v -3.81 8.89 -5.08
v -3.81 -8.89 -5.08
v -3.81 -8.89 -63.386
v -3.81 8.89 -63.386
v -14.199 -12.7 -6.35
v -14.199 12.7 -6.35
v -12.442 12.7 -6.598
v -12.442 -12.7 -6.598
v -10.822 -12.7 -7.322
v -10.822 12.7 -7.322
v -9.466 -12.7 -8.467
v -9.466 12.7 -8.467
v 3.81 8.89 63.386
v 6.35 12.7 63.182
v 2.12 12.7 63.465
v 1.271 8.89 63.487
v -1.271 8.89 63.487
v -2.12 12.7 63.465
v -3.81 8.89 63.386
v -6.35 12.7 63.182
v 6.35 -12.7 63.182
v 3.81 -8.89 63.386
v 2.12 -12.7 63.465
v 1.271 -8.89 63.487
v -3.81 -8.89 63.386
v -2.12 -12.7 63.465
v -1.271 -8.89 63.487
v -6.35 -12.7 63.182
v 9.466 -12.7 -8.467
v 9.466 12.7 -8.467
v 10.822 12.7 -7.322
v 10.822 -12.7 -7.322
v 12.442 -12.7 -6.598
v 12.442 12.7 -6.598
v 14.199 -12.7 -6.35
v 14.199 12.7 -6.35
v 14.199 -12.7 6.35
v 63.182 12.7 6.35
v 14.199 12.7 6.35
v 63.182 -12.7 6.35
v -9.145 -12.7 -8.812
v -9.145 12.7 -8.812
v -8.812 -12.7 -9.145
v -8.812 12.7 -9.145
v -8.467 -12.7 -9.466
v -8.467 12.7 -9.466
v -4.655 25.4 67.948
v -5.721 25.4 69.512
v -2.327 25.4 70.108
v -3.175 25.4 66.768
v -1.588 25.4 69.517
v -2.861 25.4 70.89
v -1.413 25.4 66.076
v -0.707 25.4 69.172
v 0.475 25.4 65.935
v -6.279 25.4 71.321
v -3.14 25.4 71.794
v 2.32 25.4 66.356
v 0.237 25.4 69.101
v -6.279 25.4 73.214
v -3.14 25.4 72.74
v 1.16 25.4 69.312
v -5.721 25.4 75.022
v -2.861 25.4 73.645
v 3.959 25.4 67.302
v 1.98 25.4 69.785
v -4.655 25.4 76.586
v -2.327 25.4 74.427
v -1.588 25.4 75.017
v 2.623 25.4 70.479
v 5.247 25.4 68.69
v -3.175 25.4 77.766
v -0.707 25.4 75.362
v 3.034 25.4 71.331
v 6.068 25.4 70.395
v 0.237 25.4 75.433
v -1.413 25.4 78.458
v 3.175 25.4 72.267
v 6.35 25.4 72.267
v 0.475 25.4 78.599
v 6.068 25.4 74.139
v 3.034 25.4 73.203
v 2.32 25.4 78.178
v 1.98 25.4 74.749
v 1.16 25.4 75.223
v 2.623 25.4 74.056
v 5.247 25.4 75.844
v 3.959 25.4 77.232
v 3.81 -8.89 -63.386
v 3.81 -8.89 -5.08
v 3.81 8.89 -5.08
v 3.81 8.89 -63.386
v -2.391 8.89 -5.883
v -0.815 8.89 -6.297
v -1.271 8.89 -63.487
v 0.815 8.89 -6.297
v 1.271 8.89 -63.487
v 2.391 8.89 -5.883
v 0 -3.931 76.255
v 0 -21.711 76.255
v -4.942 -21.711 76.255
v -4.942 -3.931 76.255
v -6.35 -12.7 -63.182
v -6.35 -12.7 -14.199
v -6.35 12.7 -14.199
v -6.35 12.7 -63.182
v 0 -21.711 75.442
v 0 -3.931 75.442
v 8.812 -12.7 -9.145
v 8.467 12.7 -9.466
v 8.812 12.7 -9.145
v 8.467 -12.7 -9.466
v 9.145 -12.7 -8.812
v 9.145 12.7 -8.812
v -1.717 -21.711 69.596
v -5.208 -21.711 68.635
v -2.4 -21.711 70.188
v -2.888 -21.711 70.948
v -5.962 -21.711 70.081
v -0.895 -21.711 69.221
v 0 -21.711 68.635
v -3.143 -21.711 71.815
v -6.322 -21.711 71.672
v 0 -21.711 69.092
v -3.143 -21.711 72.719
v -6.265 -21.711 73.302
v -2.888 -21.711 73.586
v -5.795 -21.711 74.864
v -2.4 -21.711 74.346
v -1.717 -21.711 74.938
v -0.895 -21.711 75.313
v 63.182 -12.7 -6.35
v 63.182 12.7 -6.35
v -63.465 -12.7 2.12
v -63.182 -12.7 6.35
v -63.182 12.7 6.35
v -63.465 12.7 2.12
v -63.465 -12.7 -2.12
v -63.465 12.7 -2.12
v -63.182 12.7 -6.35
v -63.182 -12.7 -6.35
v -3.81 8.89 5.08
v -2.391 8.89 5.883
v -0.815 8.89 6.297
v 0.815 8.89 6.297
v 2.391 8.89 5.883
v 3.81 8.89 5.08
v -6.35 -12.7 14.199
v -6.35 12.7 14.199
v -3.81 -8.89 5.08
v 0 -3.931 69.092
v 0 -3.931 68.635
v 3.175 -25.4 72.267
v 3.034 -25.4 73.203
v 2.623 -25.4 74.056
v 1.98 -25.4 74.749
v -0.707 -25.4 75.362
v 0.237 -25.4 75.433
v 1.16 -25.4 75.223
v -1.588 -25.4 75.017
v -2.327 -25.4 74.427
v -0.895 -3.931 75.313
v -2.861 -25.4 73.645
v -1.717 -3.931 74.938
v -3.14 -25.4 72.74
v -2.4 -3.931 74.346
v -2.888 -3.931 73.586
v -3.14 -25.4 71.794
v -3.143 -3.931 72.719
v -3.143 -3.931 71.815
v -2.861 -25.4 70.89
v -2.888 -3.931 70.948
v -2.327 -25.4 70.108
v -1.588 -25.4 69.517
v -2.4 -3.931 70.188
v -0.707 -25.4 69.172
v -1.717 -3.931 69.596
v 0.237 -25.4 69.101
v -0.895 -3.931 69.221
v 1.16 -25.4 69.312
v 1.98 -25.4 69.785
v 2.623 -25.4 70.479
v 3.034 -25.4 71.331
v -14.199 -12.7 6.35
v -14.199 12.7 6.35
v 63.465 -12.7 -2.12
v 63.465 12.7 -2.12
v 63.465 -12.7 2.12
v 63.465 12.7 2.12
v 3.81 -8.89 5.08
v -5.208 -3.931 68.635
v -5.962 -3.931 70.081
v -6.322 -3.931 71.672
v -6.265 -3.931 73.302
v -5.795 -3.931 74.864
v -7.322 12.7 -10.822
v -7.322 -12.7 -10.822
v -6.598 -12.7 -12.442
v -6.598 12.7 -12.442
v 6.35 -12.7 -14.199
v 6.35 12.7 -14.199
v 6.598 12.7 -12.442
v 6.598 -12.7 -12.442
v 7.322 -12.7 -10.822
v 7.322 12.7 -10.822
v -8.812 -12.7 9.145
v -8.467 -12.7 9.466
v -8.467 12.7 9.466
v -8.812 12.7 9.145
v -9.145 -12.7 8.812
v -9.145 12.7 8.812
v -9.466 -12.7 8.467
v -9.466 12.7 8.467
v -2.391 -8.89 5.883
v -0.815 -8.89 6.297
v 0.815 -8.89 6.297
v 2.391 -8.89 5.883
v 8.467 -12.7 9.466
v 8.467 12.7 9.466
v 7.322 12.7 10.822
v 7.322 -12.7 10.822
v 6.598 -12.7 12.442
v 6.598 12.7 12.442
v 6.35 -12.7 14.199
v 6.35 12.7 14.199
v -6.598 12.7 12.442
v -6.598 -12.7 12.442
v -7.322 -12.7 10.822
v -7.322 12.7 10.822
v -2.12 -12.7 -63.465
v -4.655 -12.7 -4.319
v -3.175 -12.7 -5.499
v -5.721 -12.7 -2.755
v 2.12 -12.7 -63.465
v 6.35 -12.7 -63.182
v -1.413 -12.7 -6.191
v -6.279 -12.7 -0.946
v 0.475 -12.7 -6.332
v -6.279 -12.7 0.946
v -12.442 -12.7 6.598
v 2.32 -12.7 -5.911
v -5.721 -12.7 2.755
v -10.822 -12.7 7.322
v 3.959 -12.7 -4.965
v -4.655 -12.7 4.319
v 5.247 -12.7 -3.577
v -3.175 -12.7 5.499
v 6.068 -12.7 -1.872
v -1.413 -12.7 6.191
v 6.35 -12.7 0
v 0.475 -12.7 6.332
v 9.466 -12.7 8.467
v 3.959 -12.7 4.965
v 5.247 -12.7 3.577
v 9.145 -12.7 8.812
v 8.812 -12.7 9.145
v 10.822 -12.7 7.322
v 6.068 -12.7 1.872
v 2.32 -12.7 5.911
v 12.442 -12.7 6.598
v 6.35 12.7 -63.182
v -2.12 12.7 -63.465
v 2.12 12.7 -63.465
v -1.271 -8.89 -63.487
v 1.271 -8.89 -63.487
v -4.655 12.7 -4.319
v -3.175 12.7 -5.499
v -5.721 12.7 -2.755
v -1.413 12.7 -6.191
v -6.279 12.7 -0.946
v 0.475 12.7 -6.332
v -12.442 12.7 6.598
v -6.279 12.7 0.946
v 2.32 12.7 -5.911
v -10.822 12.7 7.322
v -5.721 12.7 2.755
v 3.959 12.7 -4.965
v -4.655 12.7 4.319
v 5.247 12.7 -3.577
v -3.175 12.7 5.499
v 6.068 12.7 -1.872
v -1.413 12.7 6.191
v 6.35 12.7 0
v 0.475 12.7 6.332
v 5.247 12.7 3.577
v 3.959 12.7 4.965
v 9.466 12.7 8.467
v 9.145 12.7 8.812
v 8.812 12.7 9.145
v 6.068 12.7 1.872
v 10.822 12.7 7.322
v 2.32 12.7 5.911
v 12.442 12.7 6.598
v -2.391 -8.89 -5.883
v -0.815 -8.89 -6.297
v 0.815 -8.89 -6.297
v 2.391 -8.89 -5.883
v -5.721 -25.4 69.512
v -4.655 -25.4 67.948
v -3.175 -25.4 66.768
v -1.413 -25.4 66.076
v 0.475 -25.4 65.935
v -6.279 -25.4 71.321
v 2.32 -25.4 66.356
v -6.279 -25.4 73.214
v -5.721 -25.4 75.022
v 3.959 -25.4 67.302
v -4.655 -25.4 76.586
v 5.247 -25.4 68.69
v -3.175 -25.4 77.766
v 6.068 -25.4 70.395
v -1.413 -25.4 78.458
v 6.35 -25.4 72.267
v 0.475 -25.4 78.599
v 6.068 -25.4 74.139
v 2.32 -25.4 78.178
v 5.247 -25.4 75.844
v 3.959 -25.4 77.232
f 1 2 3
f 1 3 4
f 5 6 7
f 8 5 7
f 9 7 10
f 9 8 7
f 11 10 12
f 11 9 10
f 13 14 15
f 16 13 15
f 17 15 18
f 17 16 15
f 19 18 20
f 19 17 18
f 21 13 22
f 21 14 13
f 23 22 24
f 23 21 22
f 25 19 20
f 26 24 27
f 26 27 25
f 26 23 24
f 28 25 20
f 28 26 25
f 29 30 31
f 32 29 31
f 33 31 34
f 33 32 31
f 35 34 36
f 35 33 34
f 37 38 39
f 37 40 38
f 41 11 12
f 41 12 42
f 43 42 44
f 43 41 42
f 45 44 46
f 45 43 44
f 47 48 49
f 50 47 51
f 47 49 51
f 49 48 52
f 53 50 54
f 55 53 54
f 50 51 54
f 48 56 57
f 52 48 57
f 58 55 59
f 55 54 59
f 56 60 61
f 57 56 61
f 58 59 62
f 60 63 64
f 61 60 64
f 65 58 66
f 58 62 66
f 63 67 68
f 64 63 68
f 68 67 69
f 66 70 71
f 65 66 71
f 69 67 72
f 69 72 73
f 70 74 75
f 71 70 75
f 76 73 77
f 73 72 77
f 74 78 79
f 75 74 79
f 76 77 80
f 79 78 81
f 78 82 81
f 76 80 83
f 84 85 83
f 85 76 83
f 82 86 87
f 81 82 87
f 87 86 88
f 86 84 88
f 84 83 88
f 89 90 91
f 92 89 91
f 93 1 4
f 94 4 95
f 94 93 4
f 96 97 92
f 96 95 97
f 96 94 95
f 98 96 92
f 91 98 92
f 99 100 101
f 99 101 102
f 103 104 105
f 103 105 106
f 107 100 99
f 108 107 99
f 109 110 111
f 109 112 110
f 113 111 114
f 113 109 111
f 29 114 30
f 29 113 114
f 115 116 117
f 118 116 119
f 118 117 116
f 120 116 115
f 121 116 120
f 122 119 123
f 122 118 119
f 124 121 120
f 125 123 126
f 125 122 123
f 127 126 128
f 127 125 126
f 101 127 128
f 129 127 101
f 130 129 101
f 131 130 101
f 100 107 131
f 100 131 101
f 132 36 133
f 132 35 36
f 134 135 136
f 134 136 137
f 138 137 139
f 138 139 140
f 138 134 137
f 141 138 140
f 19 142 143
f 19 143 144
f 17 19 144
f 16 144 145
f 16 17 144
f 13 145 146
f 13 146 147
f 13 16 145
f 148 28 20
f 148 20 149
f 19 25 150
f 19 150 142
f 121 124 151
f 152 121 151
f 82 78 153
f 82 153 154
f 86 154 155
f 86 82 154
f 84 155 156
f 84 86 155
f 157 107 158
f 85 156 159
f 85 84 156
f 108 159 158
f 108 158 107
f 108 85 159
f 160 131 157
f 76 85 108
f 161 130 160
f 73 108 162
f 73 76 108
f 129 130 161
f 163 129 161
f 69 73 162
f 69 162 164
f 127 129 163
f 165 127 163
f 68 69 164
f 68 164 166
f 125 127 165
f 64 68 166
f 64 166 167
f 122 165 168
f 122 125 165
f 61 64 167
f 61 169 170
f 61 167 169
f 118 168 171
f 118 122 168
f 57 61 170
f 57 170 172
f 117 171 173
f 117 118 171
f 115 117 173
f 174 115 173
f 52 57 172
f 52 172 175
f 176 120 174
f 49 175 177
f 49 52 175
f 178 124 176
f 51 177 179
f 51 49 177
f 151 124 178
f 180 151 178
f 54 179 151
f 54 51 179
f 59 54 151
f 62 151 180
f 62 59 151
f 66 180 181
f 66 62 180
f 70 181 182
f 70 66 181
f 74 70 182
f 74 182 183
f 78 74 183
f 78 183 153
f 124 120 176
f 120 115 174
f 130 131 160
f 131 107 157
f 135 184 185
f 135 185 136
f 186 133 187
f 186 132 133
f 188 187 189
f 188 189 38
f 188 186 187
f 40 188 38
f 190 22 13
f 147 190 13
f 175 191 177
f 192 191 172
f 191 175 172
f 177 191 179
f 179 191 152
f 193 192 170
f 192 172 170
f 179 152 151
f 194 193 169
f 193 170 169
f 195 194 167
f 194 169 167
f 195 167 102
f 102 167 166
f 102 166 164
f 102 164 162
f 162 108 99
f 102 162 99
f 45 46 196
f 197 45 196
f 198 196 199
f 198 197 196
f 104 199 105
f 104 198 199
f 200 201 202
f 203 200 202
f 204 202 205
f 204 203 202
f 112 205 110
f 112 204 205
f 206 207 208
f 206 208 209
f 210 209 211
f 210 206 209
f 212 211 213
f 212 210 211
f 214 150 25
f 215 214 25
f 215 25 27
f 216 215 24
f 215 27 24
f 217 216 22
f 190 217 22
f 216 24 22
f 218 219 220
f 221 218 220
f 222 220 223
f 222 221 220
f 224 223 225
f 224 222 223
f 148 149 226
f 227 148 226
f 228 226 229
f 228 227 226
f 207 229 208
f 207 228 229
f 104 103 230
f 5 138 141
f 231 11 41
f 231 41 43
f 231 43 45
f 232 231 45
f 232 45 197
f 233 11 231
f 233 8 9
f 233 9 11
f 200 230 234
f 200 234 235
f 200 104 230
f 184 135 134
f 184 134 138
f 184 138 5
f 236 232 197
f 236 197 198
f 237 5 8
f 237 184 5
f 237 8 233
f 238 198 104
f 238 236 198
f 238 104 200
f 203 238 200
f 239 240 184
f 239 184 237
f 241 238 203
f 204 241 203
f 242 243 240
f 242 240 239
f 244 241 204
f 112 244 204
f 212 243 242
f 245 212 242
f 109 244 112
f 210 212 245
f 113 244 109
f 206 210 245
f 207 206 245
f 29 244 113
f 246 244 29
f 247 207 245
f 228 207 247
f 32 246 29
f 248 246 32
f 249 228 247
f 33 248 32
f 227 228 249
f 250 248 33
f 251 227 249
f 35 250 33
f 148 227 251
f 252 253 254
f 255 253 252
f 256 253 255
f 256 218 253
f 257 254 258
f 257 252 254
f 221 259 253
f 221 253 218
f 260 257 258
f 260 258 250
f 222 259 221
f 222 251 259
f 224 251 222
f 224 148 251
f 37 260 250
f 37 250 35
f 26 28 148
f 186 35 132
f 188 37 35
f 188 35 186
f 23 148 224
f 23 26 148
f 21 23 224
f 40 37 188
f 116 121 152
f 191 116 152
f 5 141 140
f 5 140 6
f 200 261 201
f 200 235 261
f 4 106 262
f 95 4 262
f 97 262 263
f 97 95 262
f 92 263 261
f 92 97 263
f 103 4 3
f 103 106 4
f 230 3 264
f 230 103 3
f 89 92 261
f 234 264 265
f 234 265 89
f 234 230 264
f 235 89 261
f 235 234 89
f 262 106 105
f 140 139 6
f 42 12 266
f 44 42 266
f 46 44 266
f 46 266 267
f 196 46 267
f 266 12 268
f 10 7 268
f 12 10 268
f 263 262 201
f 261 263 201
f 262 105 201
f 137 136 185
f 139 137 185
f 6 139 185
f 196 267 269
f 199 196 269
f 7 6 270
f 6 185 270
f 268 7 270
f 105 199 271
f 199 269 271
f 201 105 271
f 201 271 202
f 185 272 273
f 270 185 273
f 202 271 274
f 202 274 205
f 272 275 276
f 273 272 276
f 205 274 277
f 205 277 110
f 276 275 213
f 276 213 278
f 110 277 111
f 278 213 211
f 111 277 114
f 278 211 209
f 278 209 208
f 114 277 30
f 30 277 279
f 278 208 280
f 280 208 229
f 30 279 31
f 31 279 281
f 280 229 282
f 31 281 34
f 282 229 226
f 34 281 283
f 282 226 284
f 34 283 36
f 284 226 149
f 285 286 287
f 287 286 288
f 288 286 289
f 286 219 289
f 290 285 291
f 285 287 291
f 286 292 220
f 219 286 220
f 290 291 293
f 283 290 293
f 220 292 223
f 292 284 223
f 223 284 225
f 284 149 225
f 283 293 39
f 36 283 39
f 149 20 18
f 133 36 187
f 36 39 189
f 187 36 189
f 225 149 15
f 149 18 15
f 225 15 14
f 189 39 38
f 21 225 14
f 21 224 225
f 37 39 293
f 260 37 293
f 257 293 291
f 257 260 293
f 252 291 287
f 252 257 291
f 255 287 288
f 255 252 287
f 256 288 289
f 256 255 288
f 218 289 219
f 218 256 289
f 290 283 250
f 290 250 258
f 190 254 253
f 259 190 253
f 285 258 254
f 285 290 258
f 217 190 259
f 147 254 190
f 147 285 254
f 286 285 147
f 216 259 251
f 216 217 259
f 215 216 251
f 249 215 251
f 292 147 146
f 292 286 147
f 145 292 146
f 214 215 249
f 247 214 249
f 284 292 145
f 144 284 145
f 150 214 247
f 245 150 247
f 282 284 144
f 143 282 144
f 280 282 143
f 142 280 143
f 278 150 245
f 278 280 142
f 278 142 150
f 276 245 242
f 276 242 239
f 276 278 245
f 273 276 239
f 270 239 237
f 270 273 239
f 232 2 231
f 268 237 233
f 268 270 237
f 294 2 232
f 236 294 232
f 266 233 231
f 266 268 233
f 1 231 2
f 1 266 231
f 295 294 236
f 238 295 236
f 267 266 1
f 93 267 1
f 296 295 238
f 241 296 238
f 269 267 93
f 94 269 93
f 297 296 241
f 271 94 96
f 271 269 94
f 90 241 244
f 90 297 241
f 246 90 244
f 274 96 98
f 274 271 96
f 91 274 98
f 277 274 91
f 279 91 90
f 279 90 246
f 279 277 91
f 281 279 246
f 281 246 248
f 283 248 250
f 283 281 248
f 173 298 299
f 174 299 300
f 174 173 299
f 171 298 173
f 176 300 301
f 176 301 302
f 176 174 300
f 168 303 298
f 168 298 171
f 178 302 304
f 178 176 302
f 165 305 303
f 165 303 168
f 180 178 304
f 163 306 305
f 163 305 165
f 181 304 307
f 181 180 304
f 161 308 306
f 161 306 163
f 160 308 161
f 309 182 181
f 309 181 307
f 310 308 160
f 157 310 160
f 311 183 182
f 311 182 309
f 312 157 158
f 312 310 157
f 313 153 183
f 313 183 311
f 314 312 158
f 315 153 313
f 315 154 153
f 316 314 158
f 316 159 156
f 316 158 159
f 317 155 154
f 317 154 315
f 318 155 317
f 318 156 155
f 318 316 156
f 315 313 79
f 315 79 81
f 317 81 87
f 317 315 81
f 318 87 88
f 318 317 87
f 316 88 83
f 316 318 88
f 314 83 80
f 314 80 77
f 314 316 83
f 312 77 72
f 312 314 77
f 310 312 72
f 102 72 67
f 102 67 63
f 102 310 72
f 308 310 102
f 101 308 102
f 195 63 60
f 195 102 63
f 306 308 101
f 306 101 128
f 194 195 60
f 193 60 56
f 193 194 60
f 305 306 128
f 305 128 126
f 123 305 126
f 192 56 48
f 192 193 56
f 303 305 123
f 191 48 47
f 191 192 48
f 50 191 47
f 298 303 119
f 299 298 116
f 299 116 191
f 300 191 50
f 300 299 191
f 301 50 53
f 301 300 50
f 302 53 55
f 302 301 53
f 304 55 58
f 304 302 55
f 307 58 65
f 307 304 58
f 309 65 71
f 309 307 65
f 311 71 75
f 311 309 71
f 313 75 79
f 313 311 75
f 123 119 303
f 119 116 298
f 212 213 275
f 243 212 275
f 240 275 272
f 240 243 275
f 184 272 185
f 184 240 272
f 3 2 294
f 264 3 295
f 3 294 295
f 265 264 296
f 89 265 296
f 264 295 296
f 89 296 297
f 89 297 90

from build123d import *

# Parameters (mm, degrees)
F0_R     = 6.35
F1_DEPTH = 12.7
F2_W     = 7.62
F2_H     = 17.78
F3_DEPTH = 63.5
F4_R     = 6.35
F4_R_2   = 3.175
F5_DEPTH = 25.4
F6_W     = 17.78
F6_H     = 7.62
F7_DEPTH = 7.62


with BuildPart() as f1:
    # F0 (on Front) → F1 (new body, symmetric)
    with BuildSketch(Plane.XZ):
        with BuildLine():
            Line((6.35, 14.1990316571), (6.35, 63.1817022563))
            ThreePointArc((6.35, 63.1817022563), (0, 63.5), (-6.35, 63.1817022563))
            Line((-6.35, 63.1817022563), (-6.35, 14.1990316571))
            ThreePointArc((-6.35, 14.1990316571), (-6.9032695997, 11.6066550127), (-8.4666666667, 9.4660211047))
            ThreePointArc((-8.4666666667, 9.4660211047), (-8.9802561211, 8.9802561211), (-9.4660211047, 8.4666666667))
            ThreePointArc((-9.4660211047, 8.4666666667), (-11.6066550127, 6.9032695997), (-14.1990316571, 6.35))
            Line((-14.1990316571, 6.35), (-63.1817022563, 6.35))
            ThreePointArc((-63.1817022563, 6.35), (-63.5, 0), (-63.1817022563, -6.35))
            Line((-63.1817022563, -6.35), (-14.1990316571, -6.35))
            ThreePointArc((-14.1990316571, -6.35), (-11.6066550127, -6.9032695997), (-9.4660211047, -8.4666666667))
            ThreePointArc((-9.4660211047, -8.4666666667), (-8.9802561211, -8.9802561211), (-8.4666666667, -9.4660211047))
            ThreePointArc((-8.4666666667, -9.4660211047), (-6.9032695997, -11.6066550127), (-6.35, -14.1990316571))
            Line((-6.35, -14.1990316571), (-6.35, -63.1817022563))
            ThreePointArc((-6.35, -63.1817022563), (0, -63.5), (6.35, -63.1817022563))
            Line((6.35, -63.1817022563), (6.35, -14.1990316571))
            ThreePointArc((6.35, -14.1990316571), (6.9032695997, -11.6066550127), (8.4666666667, -9.4660211047))
            ThreePointArc((8.4666666667, -9.4660211047), (8.9802561211, -8.9802561211), (9.4660211047, -8.4666666667))
            ThreePointArc((9.4660211047, -8.4666666667), (11.6066550127, -6.9032695997), (14.1990316571, -6.35))
            Line((14.1990316571, -6.35), (63.1817022563, -6.35))
            ThreePointArc((63.1817022563, -6.35), (63.5, 0), (63.1817022563, 6.35))
            Line((63.1817022563, 6.35), (14.1990316571, 6.35))
            ThreePointArc((14.1990316571, 6.35), (11.6066550127, 6.9032695997), (9.4660211047, 8.4666666667))
            ThreePointArc((9.4660211047, 8.4666666667), (8.9802561211, 8.9802561211), (8.4666666667, 9.4660211047))
            ThreePointArc((8.4666666667, 9.4660211047), (6.9032695997, 11.6066550127), (6.35, 14.1990316571))
        make_face()
        Circle(F0_R, mode=Mode.SUBTRACT)
    extrude(amount=F1_DEPTH, both=True)

    # F2 (on Top) → F3 (cut, symmetric)
    with BuildSketch(Plane.XY):
        Rectangle(F2_W, F2_H)
    extrude(amount=F3_DEPTH, both=True, mode=Mode.SUBTRACT)


with BuildPart() as f5:
    # F4 (on Front) → F5 (new body, symmetric)
    with BuildSketch(Plane.XZ):
        with Locations((0, 72.2670927644)):
            Circle(F4_R)
        with Locations((0, 72.2670927644)):
            Circle(F4_R_2, mode=Mode.SUBTRACT)
    extrude(amount=F5_DEPTH, both=True)

    # F6 (on Right) → F7 (cut)
    with BuildSketch(Plane.YZ):
        with Locations((-12.8212214305, 72.444621799)):
            Rectangle(F6_W, F6_H)
    extrude(amount=-F7_DEPTH, mode=Mode.SUBTRACT)


solid = Compound([f1.part, f5.part])
